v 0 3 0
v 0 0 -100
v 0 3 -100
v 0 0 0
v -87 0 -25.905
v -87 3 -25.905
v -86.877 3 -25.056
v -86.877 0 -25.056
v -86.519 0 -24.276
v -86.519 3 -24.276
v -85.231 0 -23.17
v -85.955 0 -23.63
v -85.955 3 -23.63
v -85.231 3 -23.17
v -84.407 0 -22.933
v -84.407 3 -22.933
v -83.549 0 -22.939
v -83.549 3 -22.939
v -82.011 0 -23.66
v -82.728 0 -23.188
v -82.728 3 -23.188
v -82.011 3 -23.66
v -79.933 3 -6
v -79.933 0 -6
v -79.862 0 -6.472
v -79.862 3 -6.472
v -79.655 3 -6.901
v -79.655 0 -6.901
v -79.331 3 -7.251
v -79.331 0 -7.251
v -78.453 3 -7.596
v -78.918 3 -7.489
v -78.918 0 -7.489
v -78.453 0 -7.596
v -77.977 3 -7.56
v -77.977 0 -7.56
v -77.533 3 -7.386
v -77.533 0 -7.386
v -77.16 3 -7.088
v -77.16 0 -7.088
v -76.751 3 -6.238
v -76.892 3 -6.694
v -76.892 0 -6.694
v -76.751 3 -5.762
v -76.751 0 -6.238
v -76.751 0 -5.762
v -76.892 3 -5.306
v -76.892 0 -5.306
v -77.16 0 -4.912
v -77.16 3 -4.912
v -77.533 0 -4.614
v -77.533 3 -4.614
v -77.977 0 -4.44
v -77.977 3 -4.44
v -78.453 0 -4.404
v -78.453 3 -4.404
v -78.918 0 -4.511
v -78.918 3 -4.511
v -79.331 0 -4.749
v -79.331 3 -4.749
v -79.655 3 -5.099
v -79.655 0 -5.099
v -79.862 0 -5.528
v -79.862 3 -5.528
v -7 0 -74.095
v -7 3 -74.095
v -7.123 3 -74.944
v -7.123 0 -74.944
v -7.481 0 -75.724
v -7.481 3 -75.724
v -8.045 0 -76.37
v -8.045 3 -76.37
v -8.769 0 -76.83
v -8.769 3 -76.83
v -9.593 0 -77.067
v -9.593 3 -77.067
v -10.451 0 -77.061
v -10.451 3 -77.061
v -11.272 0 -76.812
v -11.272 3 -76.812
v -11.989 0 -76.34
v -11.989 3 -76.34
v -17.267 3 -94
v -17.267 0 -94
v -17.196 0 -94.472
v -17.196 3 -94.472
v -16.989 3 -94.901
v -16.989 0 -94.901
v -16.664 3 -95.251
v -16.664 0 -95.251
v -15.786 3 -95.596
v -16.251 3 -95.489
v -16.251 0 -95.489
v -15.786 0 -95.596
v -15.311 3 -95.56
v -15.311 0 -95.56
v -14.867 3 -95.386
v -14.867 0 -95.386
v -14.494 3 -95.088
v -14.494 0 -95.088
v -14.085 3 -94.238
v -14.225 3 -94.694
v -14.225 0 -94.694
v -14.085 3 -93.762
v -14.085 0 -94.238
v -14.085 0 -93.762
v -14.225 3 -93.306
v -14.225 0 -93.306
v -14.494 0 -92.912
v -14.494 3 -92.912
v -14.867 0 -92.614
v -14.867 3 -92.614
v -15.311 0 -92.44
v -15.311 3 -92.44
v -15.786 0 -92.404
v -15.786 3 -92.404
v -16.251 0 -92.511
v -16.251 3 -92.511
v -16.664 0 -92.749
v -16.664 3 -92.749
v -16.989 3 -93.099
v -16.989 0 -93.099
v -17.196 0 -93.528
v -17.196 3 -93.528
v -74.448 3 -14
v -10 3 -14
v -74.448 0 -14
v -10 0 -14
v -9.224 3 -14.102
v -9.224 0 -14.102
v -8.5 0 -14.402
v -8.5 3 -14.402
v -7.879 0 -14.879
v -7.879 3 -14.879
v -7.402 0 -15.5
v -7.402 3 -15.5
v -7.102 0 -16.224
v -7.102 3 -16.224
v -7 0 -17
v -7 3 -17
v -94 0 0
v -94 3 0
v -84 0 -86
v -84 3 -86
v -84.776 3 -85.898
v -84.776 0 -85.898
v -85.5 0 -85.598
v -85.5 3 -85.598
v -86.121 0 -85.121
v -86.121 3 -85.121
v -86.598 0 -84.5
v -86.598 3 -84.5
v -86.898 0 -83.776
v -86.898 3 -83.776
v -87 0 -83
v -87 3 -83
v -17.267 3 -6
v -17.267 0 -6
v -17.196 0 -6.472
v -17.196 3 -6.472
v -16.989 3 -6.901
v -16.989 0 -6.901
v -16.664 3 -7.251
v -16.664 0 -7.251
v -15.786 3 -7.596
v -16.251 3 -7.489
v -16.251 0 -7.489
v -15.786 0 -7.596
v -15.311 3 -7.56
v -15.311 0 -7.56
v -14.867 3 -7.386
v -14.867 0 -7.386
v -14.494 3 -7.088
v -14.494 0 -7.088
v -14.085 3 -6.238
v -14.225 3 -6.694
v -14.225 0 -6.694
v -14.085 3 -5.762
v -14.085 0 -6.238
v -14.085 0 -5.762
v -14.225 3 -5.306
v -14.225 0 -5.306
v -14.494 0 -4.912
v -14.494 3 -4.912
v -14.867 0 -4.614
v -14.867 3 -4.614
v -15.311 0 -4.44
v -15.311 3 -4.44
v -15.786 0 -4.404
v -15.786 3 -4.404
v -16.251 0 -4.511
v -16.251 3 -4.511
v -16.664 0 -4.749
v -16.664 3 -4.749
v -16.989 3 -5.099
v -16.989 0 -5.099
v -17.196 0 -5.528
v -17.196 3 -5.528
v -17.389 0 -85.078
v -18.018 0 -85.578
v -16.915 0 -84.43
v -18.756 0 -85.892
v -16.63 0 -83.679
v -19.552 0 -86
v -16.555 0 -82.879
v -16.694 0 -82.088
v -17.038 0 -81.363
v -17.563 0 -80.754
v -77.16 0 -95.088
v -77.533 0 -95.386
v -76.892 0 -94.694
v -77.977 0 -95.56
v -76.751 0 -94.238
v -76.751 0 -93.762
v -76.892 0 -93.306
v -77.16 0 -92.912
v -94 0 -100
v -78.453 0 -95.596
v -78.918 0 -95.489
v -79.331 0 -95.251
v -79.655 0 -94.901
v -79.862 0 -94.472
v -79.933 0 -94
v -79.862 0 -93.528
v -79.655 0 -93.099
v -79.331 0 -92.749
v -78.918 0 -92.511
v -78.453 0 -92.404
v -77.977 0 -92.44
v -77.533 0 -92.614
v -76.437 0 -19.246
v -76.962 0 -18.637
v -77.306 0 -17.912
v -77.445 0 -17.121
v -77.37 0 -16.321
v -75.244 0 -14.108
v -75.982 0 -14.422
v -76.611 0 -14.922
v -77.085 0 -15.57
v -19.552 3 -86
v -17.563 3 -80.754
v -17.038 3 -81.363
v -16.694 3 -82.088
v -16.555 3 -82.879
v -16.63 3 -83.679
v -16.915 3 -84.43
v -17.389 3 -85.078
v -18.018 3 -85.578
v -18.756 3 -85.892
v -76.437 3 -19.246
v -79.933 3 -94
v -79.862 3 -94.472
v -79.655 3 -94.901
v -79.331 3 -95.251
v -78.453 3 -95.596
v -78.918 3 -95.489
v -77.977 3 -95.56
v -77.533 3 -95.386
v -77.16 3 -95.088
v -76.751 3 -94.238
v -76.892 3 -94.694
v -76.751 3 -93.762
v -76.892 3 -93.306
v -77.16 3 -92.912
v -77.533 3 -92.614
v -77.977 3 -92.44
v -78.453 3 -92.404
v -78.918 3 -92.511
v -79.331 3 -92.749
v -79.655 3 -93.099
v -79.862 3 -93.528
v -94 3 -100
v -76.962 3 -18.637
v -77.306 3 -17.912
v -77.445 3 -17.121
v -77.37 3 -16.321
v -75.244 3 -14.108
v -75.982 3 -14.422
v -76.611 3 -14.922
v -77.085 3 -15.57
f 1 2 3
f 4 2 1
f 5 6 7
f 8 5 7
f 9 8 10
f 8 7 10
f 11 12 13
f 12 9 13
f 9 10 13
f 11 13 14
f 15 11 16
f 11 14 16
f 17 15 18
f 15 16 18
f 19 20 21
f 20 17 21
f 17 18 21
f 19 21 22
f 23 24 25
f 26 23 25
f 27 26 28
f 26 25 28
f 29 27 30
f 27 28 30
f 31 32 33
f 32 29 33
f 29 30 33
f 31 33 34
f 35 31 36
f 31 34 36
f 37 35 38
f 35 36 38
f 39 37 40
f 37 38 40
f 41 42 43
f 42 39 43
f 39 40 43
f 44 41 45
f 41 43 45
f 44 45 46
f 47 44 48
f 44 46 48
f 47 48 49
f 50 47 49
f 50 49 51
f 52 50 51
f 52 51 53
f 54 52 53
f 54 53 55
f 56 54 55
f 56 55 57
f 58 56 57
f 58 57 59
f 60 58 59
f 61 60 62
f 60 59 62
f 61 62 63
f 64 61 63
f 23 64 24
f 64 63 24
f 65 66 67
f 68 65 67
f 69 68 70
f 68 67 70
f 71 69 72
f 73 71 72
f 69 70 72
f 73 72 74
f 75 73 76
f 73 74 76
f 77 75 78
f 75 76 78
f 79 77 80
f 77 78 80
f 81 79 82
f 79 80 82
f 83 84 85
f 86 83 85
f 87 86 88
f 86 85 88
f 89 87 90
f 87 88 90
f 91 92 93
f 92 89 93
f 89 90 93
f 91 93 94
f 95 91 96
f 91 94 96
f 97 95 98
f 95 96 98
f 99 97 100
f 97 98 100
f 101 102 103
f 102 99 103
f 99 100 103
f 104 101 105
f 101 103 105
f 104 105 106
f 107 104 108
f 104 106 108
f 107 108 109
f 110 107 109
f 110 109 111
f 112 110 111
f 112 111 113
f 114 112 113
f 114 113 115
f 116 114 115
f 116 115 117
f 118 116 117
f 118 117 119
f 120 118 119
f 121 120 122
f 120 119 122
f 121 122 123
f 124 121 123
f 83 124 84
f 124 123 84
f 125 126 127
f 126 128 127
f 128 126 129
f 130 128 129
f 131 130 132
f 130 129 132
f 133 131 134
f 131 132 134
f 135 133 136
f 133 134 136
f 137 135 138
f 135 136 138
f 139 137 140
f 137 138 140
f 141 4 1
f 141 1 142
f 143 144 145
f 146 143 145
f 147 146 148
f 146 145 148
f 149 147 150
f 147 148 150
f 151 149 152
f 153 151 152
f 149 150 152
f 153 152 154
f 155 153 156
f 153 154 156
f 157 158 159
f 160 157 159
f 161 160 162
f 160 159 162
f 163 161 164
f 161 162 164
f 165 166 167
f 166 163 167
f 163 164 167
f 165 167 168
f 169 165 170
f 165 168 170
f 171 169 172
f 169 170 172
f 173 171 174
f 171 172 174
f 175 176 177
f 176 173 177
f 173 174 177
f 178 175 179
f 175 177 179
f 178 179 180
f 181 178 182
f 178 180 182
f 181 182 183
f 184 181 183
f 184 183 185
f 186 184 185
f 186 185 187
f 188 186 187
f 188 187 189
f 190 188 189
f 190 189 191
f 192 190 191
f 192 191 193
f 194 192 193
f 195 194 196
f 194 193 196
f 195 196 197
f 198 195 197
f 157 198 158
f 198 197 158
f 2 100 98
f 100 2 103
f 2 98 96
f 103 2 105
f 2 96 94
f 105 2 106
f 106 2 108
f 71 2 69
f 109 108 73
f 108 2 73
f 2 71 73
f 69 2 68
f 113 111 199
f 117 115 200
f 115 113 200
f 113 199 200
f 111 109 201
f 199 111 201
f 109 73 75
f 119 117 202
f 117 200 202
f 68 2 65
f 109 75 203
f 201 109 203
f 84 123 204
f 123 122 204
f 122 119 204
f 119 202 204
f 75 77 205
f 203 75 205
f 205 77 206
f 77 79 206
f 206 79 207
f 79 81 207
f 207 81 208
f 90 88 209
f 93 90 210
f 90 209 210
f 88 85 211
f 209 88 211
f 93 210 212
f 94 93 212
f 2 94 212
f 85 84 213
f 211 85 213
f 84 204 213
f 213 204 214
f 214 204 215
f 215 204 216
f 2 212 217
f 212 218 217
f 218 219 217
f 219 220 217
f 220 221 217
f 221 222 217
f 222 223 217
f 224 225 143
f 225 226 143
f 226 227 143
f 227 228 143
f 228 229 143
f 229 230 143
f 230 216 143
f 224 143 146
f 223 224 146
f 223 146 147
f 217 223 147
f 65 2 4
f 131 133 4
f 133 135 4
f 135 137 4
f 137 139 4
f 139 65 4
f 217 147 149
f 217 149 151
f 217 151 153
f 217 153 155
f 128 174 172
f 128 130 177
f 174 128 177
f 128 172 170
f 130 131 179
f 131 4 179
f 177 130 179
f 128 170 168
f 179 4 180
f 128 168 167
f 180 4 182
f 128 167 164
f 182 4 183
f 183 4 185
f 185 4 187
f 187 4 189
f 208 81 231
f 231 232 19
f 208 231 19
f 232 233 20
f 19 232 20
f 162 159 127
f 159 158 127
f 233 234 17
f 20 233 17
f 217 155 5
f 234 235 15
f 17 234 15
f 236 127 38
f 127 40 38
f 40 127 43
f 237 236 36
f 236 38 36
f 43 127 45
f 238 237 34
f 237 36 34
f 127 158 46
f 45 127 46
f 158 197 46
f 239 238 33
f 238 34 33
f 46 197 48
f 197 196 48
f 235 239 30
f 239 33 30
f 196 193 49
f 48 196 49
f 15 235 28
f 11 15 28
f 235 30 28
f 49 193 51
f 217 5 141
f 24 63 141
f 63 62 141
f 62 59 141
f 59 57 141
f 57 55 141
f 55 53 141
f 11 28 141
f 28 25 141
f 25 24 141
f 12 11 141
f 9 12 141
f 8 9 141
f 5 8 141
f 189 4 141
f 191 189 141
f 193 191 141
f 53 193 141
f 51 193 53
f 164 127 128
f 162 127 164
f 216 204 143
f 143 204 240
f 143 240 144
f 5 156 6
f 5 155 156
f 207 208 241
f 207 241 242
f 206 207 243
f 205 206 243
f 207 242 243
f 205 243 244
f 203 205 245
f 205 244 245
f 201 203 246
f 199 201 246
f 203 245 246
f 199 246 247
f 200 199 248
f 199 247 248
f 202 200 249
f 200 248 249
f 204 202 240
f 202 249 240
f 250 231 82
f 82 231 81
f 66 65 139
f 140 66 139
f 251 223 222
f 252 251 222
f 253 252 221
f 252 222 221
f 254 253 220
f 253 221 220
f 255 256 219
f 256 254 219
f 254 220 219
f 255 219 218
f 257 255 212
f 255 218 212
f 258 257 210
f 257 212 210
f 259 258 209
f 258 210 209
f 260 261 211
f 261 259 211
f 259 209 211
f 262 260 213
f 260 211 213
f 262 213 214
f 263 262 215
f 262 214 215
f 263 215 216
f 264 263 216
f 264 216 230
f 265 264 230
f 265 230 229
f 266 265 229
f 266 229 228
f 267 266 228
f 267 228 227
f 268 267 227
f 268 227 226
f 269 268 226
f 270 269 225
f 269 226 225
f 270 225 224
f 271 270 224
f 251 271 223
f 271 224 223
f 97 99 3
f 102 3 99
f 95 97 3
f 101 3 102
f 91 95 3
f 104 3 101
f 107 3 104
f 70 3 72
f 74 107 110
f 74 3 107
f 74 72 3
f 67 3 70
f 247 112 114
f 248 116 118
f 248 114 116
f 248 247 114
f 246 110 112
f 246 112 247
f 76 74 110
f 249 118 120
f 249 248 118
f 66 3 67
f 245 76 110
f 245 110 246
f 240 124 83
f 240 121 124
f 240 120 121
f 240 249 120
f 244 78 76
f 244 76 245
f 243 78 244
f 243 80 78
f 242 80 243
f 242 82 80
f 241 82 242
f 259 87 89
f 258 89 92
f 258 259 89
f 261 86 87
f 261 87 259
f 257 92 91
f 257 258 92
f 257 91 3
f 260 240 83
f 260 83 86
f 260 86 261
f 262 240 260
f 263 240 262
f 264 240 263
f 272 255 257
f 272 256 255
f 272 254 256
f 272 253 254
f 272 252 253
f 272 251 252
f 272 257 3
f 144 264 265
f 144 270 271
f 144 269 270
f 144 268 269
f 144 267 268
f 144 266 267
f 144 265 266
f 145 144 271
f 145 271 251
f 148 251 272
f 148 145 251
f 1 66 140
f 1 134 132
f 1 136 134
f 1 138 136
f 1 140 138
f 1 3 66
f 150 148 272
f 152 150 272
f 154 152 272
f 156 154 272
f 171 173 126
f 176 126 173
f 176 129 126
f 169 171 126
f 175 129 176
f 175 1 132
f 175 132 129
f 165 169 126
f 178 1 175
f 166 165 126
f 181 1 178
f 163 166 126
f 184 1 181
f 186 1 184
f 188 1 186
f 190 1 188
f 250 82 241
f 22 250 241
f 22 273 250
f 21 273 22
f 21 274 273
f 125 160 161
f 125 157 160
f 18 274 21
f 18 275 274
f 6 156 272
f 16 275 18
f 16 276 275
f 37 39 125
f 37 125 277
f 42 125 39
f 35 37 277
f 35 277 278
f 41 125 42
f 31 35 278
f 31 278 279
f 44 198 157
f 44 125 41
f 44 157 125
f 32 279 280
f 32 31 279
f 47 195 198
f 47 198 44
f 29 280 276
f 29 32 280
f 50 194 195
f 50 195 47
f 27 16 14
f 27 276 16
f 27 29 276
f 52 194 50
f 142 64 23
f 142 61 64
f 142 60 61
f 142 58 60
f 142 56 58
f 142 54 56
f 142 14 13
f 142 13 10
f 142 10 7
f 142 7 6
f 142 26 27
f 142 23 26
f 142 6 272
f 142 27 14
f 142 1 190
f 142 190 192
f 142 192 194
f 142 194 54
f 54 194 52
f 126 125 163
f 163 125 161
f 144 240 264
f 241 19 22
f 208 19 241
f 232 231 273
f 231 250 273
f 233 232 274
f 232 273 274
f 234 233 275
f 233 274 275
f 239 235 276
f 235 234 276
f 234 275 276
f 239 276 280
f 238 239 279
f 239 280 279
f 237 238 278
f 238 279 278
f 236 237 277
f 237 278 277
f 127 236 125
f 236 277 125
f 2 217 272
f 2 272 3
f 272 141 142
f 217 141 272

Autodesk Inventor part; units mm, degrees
ref_plane "YZ Plane" through (0, 0, 0) normal (1, 0, 0) x (0, 1, 0)
ref_plane "XZ Plane" through (0, 0, 0) normal (0, 1, 0) x (-1, 0, 0)
ref_plane "XY Plane" through (0, 0, 0) normal (0, 0, 1) x (1, 0, 0)
sketch "Sketch1" plane through (0, 0, 0) normal (0, 1, 0) x (-1, 0, 0)
  line L0 (0, 0) -> (94, 0)
  line L1 (94, -100) -> (0, -100)
  line L2 (0, -100) -> (0, 0)
  line L3 (94, 0) -> (0, 0) construction
  line L4 (0, 0) -> (0, -9) construction
  line L5 (0, -9) -> (94, -9) construction
  line L6 (94, -9) -> (94, 0) construction
  line L7 (0, -100) -> (94, -100) construction
  line L8 (94, -100) -> (94, -91) construction
  line L9 (94, -91) -> (0, -91) construction
  line L10 (0, -91) -> (0, -100) construction
  line L11 (94, 0) -> (94, -100)
  circle A0 centre (78.3333, -6) radius 1.6
  circle A1 centre (15.6667, -6) radius 1.6
  circle A2 centre (78.3333, -94) radius 1.6
  circle A3 centre (15.6667, -94) radius 1.6
  line L12 (82.3582, -14) -> (7, -80.7604)
  line L13 (7, -80.7604) -> (7, -14)
  line L14 (7, -14) -> (82.3582, -14)
  line L15 (87, -19.2396) -> (11.6418, -86)
  line L16 (11.6418, -86) -> (87, -86)
  line L17 (87, -86) -> (87, -19.2396)
  line L18 (82.3582, -14) -> (87, -19.2396) construction
  line L19 (11.6418, -86) -> (7, -80.7604) construction
  dimension "d0" = 100
  dimension "d1" = 9
  dimension "d2" = 3
  dimension "d3" = 3.2
  dimension "d4" = 15.6667
  dimension "d5" = 62.6667
  dimension "d6" = 94
  dimension "d7" = 3
  dimension "d10" = 7
  dimension "d11" = 7
  dimension "d12" = 7
  dimension "d13" = 5
  dimension "d14" = 5
extrude "Extrusion1" add sketch "Sketch1" along normal blind 3
fillet "Fillet1" radius 3 6 edges at (-82.3582, 1.5, -14) (-7, 1.5, -14) (-7, 1.5, -80.7604) (-87, 1.5, -19.2396) (-11.6418, 1.5, -86) (-87, 1.5, -86)
equation "\"d4\" = 0.166667 * d6"
equation "\"d5\" = 4 * d4"
equation "\"d11\" = d10"
equation "\"d12\" = d11"
equation "\"d14\" = d13"
properties part number "FrontPanel"
